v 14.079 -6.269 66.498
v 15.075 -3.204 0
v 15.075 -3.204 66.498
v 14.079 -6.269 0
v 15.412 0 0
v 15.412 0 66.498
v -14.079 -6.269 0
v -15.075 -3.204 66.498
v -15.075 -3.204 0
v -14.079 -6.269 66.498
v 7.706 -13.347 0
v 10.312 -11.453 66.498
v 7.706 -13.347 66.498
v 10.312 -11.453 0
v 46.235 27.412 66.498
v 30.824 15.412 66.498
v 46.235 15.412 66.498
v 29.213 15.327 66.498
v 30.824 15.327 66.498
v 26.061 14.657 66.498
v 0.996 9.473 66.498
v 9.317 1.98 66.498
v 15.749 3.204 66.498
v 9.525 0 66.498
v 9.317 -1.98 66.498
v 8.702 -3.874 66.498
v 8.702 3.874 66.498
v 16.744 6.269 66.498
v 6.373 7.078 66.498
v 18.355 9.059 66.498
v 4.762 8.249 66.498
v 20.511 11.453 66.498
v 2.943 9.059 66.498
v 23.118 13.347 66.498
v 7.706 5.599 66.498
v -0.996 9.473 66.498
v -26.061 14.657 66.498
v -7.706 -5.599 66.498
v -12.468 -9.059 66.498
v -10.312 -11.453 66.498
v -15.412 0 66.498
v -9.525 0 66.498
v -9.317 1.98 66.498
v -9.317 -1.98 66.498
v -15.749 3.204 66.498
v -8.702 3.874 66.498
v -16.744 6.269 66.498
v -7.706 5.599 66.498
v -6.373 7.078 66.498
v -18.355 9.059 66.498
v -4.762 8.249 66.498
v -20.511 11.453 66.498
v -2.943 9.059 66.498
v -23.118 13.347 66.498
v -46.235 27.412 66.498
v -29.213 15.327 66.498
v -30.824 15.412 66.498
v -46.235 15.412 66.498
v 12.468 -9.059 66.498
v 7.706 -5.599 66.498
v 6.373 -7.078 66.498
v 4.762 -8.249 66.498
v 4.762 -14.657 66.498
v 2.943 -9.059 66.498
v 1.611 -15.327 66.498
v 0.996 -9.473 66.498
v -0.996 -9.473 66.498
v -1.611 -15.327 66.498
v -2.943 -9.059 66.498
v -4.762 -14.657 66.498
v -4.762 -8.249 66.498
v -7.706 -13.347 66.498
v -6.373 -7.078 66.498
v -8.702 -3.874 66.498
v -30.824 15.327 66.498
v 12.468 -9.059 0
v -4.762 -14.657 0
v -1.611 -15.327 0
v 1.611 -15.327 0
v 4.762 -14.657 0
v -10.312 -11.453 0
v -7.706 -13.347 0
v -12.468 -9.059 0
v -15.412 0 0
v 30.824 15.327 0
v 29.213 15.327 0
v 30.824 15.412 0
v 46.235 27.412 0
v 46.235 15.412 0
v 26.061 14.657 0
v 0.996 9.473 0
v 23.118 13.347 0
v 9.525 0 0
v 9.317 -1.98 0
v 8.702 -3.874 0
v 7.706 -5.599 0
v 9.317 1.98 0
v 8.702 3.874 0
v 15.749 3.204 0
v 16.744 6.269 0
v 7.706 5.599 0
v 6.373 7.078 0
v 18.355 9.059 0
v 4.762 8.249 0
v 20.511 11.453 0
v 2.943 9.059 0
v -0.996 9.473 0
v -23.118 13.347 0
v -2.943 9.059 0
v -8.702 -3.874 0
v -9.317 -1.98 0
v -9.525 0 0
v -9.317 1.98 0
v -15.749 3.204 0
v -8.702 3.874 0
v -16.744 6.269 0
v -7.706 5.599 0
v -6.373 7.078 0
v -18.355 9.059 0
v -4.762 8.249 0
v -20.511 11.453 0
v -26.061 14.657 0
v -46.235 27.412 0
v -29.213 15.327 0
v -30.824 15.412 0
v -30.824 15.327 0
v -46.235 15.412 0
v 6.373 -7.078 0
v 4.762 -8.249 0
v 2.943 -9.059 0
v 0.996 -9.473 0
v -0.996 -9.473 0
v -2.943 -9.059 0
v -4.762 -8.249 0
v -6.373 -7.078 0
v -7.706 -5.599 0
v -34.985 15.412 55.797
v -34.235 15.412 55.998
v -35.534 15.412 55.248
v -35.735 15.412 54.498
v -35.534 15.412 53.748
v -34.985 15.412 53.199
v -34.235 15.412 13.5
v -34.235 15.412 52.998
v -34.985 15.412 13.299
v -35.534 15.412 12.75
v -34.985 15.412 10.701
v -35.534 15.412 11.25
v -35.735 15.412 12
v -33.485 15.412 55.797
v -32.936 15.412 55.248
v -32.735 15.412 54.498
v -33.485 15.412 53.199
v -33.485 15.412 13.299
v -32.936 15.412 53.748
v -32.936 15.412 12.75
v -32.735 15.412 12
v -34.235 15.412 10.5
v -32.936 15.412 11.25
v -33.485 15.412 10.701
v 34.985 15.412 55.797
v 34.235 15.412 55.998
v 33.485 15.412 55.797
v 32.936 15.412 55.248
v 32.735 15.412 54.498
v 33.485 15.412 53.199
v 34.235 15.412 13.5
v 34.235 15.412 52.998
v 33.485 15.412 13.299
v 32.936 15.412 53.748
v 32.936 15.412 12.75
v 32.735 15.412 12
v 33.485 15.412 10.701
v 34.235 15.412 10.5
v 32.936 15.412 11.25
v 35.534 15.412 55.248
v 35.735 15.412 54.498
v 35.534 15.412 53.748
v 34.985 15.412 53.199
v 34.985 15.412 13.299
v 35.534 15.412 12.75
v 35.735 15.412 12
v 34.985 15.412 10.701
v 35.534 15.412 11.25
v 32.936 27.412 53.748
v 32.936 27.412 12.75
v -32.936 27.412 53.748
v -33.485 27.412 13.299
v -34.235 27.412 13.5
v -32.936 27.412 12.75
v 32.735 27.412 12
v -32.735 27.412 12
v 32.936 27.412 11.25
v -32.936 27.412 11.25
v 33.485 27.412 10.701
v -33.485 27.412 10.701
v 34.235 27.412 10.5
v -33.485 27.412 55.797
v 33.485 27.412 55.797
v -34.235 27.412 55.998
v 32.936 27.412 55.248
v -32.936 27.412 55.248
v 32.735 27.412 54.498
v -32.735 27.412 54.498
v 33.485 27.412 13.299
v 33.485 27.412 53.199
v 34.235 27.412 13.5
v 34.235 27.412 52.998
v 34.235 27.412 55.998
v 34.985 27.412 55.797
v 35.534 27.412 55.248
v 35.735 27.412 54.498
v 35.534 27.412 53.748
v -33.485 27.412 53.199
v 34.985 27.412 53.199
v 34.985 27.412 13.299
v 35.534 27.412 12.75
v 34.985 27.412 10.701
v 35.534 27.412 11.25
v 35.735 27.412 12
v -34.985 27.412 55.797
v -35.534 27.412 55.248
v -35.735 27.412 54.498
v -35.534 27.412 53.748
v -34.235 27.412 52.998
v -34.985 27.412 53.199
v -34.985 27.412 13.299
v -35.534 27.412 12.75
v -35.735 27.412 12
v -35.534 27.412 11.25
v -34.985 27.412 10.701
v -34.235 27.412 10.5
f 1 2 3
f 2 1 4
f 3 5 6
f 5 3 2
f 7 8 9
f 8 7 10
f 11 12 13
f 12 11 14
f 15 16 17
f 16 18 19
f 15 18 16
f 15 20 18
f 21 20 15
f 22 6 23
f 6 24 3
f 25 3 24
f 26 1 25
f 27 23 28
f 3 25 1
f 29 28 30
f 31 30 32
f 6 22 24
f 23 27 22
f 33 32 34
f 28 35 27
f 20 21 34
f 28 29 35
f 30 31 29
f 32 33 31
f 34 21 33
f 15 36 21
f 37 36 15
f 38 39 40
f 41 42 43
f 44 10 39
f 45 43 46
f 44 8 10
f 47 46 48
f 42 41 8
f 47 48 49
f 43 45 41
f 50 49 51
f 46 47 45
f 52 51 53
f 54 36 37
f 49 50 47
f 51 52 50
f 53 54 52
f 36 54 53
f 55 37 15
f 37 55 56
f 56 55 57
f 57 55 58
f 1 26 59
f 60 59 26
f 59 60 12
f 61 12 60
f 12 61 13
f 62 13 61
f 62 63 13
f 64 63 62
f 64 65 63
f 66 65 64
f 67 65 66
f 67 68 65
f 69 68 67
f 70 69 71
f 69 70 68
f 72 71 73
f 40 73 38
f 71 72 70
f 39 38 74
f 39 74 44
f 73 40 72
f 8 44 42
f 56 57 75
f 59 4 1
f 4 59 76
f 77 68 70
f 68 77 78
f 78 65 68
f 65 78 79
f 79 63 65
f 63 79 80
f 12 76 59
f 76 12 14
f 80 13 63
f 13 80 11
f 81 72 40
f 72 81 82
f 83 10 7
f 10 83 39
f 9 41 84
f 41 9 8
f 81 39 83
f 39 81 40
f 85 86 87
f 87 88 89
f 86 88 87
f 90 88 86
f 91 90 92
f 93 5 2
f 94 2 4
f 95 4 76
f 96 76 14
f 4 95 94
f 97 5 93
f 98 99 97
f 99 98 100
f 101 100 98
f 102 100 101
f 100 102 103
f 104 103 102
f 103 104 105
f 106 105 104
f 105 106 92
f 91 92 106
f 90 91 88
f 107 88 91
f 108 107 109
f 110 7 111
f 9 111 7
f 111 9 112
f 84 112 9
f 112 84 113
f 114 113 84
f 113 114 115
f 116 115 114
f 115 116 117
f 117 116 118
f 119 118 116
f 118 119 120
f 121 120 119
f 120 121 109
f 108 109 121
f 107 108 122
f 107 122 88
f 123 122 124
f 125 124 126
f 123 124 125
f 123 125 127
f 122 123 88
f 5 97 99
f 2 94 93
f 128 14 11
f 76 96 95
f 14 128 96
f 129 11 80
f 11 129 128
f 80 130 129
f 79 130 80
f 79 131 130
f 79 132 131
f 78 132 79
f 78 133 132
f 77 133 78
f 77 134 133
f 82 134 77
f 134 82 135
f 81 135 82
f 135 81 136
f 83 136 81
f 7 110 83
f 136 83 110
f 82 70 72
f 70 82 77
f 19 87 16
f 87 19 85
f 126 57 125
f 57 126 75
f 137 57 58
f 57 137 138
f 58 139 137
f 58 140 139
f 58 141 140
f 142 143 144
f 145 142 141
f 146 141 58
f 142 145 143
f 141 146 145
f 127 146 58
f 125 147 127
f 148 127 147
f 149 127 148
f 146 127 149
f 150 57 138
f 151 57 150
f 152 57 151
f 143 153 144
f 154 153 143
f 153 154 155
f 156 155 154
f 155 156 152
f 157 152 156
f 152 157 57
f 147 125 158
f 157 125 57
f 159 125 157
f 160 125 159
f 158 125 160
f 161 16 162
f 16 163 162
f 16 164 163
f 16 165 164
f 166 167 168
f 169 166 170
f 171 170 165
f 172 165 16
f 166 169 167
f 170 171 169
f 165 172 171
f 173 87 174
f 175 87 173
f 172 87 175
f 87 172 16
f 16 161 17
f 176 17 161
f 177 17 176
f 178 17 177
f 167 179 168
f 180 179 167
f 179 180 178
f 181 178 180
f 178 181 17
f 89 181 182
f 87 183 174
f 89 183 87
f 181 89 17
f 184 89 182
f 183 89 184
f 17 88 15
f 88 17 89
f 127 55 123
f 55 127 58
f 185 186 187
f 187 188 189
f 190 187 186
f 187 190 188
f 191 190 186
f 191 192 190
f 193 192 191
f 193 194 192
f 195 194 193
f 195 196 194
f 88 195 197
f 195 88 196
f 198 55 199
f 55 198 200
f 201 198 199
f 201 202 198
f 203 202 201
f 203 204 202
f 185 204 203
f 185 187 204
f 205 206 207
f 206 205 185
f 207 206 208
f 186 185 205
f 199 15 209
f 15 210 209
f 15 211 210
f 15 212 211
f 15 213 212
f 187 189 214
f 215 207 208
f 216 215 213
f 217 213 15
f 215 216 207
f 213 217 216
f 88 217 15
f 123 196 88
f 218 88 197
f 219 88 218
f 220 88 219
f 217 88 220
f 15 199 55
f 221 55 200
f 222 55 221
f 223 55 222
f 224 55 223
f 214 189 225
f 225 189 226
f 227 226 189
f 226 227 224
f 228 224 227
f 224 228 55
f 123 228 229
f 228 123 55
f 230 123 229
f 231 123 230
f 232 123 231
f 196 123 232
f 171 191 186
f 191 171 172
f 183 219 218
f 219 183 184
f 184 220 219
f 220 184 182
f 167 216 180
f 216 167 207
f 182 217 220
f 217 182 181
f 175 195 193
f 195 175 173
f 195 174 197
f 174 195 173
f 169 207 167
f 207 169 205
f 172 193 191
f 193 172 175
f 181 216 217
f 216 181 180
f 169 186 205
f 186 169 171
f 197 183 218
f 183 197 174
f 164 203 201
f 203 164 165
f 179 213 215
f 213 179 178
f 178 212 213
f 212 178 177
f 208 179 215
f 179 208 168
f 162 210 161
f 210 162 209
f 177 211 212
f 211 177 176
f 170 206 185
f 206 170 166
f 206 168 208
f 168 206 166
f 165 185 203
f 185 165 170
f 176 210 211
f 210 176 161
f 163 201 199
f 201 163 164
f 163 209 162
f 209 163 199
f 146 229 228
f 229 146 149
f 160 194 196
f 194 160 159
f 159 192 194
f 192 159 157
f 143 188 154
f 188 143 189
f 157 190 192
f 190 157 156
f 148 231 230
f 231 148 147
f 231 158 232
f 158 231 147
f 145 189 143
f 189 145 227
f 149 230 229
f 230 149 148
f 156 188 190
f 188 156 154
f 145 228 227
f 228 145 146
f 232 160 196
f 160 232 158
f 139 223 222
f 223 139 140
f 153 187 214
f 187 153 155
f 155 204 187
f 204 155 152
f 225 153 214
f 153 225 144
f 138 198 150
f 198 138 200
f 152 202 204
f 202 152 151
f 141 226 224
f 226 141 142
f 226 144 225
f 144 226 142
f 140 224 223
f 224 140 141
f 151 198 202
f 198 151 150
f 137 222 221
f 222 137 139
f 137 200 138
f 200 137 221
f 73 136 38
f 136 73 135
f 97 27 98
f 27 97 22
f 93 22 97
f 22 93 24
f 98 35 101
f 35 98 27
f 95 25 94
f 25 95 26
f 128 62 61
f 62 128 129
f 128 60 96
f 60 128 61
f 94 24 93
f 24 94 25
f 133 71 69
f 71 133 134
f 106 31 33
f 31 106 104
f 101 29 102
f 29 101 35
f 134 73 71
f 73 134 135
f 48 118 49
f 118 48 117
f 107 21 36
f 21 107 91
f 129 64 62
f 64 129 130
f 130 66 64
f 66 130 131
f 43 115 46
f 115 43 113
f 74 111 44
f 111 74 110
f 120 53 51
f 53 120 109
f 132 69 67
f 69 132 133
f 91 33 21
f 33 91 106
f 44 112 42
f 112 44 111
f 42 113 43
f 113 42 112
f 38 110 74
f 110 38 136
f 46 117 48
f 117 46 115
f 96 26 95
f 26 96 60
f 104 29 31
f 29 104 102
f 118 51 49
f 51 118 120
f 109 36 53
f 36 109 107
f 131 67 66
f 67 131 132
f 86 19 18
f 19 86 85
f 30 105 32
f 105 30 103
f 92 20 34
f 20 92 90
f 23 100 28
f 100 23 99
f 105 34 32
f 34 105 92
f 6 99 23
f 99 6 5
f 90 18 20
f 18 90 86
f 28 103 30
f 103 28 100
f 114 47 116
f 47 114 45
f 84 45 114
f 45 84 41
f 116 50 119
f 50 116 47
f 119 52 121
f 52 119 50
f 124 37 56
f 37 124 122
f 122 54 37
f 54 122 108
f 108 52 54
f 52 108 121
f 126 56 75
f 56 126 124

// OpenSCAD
joinfactor = 0.25;
goldenratio = 1.61803399;

gDefaultIR = 3/8/2*25.4;
gDefaultOR = 3/4/2*25.4;
gDefaultBlockORFactor = goldenratio;

gDefaultFlangeThickness = 1/16*25.4;
gDefaultFlangeRadius = 3/4/2*25.4;
gDefaultBushingLength = 1*25.4;

gDefaultBlockWidth = gDefaultOR*gDefaultBlockORFactor*2*3;
gDefaultBlockDepth = 12;

gDefaultHoleSize = 3/2;		// M3 screw hole

//bushing(gDefaultIR, gDefaultOR, gDefaultBushingLength, gDefaultFlangeRadius, gDefaultFlangeThickness);
//bushing(gDefaultIR, gDefaultOR, gDefaultBushingLength);
//bushingblock(gDefaultIR, gDefaultOR, gDefaultBushingLength*2, gDefaultBlockWidth, gDefaultBlockDepth,
//	gDefaultFlangeRadius, gDefaultFlangeThickness);

bushingblock(gDefaultIR, gDefaultOR, gDefaultBushingLength*goldenratio*goldenratio, gDefaultBlockWidth, gDefaultBlockDepth,
	gDefaultFlangeRadius, gDefaultFlangeThickness);

module bushing(IR, OR, length, flangeRadius, flangeThickness)
{
	difference()
	{
		union()
		{
			cylinder(r=OR, h=length);
			cylinder(r=flangeRadius, h=flangeThickness);
		}

		translate([0, 0, -joinfactor])
		cylinder(r=IR, h=length+joinfactor*2);
	}
}

module bushingblock(IR, OR, length,  width, depth, flangeRadius, flangeThickness)
{
	blockOR = OR*gDefaultBlockORFactor;

	difference()
	{
		union()
		{
			cylinder(r=blockOR, h=length);

			// A block that will later become the rounded attachment
			// to the flat mounting base
			translate([-blockOR*2, 0, 0])
			cube(size=[blockOR*4, blockOR, length]);

			// The platform block
			translate([-width/2, blockOR,0])
			cube(size=[width, depth, length]);
		}

		// Create the space for the bushing
		translate([0, 0, -joinfactor])
		cylinder(r=OR, h=length+2*joinfactor);

		// Do some smoothing at the connection between the bushing cover
		// and the platform plate
		translate([blockOR*2, 0, -joinfactor])
		cylinder(r=blockOR, h=length+2*joinfactor);

		translate([-blockOR*2, 0, -joinfactor])
		cylinder(r=blockOR, h=length+2*joinfactor);


		// put in some M3 holes for tapping to whatever size is needed
		for(trans=[
			[width/2-depth, 0, depth],
			[width/2-depth, 0, length-depth],
			[-width/2+depth, 0, depth],
			[-width/2+depth, 0, length-depth]])
		{
			translate(trans)
			rotate([-90, 0, 0])
			cylinder(r=gDefaultHoleSize, h=blockOR+depth+joinfactor, $fn=12);

		}

		// Don't create a space for the flange as it can sit on the
		// outside of the block as a holder
		// Or you may be using a bushing without a flange
		//
	}
}
